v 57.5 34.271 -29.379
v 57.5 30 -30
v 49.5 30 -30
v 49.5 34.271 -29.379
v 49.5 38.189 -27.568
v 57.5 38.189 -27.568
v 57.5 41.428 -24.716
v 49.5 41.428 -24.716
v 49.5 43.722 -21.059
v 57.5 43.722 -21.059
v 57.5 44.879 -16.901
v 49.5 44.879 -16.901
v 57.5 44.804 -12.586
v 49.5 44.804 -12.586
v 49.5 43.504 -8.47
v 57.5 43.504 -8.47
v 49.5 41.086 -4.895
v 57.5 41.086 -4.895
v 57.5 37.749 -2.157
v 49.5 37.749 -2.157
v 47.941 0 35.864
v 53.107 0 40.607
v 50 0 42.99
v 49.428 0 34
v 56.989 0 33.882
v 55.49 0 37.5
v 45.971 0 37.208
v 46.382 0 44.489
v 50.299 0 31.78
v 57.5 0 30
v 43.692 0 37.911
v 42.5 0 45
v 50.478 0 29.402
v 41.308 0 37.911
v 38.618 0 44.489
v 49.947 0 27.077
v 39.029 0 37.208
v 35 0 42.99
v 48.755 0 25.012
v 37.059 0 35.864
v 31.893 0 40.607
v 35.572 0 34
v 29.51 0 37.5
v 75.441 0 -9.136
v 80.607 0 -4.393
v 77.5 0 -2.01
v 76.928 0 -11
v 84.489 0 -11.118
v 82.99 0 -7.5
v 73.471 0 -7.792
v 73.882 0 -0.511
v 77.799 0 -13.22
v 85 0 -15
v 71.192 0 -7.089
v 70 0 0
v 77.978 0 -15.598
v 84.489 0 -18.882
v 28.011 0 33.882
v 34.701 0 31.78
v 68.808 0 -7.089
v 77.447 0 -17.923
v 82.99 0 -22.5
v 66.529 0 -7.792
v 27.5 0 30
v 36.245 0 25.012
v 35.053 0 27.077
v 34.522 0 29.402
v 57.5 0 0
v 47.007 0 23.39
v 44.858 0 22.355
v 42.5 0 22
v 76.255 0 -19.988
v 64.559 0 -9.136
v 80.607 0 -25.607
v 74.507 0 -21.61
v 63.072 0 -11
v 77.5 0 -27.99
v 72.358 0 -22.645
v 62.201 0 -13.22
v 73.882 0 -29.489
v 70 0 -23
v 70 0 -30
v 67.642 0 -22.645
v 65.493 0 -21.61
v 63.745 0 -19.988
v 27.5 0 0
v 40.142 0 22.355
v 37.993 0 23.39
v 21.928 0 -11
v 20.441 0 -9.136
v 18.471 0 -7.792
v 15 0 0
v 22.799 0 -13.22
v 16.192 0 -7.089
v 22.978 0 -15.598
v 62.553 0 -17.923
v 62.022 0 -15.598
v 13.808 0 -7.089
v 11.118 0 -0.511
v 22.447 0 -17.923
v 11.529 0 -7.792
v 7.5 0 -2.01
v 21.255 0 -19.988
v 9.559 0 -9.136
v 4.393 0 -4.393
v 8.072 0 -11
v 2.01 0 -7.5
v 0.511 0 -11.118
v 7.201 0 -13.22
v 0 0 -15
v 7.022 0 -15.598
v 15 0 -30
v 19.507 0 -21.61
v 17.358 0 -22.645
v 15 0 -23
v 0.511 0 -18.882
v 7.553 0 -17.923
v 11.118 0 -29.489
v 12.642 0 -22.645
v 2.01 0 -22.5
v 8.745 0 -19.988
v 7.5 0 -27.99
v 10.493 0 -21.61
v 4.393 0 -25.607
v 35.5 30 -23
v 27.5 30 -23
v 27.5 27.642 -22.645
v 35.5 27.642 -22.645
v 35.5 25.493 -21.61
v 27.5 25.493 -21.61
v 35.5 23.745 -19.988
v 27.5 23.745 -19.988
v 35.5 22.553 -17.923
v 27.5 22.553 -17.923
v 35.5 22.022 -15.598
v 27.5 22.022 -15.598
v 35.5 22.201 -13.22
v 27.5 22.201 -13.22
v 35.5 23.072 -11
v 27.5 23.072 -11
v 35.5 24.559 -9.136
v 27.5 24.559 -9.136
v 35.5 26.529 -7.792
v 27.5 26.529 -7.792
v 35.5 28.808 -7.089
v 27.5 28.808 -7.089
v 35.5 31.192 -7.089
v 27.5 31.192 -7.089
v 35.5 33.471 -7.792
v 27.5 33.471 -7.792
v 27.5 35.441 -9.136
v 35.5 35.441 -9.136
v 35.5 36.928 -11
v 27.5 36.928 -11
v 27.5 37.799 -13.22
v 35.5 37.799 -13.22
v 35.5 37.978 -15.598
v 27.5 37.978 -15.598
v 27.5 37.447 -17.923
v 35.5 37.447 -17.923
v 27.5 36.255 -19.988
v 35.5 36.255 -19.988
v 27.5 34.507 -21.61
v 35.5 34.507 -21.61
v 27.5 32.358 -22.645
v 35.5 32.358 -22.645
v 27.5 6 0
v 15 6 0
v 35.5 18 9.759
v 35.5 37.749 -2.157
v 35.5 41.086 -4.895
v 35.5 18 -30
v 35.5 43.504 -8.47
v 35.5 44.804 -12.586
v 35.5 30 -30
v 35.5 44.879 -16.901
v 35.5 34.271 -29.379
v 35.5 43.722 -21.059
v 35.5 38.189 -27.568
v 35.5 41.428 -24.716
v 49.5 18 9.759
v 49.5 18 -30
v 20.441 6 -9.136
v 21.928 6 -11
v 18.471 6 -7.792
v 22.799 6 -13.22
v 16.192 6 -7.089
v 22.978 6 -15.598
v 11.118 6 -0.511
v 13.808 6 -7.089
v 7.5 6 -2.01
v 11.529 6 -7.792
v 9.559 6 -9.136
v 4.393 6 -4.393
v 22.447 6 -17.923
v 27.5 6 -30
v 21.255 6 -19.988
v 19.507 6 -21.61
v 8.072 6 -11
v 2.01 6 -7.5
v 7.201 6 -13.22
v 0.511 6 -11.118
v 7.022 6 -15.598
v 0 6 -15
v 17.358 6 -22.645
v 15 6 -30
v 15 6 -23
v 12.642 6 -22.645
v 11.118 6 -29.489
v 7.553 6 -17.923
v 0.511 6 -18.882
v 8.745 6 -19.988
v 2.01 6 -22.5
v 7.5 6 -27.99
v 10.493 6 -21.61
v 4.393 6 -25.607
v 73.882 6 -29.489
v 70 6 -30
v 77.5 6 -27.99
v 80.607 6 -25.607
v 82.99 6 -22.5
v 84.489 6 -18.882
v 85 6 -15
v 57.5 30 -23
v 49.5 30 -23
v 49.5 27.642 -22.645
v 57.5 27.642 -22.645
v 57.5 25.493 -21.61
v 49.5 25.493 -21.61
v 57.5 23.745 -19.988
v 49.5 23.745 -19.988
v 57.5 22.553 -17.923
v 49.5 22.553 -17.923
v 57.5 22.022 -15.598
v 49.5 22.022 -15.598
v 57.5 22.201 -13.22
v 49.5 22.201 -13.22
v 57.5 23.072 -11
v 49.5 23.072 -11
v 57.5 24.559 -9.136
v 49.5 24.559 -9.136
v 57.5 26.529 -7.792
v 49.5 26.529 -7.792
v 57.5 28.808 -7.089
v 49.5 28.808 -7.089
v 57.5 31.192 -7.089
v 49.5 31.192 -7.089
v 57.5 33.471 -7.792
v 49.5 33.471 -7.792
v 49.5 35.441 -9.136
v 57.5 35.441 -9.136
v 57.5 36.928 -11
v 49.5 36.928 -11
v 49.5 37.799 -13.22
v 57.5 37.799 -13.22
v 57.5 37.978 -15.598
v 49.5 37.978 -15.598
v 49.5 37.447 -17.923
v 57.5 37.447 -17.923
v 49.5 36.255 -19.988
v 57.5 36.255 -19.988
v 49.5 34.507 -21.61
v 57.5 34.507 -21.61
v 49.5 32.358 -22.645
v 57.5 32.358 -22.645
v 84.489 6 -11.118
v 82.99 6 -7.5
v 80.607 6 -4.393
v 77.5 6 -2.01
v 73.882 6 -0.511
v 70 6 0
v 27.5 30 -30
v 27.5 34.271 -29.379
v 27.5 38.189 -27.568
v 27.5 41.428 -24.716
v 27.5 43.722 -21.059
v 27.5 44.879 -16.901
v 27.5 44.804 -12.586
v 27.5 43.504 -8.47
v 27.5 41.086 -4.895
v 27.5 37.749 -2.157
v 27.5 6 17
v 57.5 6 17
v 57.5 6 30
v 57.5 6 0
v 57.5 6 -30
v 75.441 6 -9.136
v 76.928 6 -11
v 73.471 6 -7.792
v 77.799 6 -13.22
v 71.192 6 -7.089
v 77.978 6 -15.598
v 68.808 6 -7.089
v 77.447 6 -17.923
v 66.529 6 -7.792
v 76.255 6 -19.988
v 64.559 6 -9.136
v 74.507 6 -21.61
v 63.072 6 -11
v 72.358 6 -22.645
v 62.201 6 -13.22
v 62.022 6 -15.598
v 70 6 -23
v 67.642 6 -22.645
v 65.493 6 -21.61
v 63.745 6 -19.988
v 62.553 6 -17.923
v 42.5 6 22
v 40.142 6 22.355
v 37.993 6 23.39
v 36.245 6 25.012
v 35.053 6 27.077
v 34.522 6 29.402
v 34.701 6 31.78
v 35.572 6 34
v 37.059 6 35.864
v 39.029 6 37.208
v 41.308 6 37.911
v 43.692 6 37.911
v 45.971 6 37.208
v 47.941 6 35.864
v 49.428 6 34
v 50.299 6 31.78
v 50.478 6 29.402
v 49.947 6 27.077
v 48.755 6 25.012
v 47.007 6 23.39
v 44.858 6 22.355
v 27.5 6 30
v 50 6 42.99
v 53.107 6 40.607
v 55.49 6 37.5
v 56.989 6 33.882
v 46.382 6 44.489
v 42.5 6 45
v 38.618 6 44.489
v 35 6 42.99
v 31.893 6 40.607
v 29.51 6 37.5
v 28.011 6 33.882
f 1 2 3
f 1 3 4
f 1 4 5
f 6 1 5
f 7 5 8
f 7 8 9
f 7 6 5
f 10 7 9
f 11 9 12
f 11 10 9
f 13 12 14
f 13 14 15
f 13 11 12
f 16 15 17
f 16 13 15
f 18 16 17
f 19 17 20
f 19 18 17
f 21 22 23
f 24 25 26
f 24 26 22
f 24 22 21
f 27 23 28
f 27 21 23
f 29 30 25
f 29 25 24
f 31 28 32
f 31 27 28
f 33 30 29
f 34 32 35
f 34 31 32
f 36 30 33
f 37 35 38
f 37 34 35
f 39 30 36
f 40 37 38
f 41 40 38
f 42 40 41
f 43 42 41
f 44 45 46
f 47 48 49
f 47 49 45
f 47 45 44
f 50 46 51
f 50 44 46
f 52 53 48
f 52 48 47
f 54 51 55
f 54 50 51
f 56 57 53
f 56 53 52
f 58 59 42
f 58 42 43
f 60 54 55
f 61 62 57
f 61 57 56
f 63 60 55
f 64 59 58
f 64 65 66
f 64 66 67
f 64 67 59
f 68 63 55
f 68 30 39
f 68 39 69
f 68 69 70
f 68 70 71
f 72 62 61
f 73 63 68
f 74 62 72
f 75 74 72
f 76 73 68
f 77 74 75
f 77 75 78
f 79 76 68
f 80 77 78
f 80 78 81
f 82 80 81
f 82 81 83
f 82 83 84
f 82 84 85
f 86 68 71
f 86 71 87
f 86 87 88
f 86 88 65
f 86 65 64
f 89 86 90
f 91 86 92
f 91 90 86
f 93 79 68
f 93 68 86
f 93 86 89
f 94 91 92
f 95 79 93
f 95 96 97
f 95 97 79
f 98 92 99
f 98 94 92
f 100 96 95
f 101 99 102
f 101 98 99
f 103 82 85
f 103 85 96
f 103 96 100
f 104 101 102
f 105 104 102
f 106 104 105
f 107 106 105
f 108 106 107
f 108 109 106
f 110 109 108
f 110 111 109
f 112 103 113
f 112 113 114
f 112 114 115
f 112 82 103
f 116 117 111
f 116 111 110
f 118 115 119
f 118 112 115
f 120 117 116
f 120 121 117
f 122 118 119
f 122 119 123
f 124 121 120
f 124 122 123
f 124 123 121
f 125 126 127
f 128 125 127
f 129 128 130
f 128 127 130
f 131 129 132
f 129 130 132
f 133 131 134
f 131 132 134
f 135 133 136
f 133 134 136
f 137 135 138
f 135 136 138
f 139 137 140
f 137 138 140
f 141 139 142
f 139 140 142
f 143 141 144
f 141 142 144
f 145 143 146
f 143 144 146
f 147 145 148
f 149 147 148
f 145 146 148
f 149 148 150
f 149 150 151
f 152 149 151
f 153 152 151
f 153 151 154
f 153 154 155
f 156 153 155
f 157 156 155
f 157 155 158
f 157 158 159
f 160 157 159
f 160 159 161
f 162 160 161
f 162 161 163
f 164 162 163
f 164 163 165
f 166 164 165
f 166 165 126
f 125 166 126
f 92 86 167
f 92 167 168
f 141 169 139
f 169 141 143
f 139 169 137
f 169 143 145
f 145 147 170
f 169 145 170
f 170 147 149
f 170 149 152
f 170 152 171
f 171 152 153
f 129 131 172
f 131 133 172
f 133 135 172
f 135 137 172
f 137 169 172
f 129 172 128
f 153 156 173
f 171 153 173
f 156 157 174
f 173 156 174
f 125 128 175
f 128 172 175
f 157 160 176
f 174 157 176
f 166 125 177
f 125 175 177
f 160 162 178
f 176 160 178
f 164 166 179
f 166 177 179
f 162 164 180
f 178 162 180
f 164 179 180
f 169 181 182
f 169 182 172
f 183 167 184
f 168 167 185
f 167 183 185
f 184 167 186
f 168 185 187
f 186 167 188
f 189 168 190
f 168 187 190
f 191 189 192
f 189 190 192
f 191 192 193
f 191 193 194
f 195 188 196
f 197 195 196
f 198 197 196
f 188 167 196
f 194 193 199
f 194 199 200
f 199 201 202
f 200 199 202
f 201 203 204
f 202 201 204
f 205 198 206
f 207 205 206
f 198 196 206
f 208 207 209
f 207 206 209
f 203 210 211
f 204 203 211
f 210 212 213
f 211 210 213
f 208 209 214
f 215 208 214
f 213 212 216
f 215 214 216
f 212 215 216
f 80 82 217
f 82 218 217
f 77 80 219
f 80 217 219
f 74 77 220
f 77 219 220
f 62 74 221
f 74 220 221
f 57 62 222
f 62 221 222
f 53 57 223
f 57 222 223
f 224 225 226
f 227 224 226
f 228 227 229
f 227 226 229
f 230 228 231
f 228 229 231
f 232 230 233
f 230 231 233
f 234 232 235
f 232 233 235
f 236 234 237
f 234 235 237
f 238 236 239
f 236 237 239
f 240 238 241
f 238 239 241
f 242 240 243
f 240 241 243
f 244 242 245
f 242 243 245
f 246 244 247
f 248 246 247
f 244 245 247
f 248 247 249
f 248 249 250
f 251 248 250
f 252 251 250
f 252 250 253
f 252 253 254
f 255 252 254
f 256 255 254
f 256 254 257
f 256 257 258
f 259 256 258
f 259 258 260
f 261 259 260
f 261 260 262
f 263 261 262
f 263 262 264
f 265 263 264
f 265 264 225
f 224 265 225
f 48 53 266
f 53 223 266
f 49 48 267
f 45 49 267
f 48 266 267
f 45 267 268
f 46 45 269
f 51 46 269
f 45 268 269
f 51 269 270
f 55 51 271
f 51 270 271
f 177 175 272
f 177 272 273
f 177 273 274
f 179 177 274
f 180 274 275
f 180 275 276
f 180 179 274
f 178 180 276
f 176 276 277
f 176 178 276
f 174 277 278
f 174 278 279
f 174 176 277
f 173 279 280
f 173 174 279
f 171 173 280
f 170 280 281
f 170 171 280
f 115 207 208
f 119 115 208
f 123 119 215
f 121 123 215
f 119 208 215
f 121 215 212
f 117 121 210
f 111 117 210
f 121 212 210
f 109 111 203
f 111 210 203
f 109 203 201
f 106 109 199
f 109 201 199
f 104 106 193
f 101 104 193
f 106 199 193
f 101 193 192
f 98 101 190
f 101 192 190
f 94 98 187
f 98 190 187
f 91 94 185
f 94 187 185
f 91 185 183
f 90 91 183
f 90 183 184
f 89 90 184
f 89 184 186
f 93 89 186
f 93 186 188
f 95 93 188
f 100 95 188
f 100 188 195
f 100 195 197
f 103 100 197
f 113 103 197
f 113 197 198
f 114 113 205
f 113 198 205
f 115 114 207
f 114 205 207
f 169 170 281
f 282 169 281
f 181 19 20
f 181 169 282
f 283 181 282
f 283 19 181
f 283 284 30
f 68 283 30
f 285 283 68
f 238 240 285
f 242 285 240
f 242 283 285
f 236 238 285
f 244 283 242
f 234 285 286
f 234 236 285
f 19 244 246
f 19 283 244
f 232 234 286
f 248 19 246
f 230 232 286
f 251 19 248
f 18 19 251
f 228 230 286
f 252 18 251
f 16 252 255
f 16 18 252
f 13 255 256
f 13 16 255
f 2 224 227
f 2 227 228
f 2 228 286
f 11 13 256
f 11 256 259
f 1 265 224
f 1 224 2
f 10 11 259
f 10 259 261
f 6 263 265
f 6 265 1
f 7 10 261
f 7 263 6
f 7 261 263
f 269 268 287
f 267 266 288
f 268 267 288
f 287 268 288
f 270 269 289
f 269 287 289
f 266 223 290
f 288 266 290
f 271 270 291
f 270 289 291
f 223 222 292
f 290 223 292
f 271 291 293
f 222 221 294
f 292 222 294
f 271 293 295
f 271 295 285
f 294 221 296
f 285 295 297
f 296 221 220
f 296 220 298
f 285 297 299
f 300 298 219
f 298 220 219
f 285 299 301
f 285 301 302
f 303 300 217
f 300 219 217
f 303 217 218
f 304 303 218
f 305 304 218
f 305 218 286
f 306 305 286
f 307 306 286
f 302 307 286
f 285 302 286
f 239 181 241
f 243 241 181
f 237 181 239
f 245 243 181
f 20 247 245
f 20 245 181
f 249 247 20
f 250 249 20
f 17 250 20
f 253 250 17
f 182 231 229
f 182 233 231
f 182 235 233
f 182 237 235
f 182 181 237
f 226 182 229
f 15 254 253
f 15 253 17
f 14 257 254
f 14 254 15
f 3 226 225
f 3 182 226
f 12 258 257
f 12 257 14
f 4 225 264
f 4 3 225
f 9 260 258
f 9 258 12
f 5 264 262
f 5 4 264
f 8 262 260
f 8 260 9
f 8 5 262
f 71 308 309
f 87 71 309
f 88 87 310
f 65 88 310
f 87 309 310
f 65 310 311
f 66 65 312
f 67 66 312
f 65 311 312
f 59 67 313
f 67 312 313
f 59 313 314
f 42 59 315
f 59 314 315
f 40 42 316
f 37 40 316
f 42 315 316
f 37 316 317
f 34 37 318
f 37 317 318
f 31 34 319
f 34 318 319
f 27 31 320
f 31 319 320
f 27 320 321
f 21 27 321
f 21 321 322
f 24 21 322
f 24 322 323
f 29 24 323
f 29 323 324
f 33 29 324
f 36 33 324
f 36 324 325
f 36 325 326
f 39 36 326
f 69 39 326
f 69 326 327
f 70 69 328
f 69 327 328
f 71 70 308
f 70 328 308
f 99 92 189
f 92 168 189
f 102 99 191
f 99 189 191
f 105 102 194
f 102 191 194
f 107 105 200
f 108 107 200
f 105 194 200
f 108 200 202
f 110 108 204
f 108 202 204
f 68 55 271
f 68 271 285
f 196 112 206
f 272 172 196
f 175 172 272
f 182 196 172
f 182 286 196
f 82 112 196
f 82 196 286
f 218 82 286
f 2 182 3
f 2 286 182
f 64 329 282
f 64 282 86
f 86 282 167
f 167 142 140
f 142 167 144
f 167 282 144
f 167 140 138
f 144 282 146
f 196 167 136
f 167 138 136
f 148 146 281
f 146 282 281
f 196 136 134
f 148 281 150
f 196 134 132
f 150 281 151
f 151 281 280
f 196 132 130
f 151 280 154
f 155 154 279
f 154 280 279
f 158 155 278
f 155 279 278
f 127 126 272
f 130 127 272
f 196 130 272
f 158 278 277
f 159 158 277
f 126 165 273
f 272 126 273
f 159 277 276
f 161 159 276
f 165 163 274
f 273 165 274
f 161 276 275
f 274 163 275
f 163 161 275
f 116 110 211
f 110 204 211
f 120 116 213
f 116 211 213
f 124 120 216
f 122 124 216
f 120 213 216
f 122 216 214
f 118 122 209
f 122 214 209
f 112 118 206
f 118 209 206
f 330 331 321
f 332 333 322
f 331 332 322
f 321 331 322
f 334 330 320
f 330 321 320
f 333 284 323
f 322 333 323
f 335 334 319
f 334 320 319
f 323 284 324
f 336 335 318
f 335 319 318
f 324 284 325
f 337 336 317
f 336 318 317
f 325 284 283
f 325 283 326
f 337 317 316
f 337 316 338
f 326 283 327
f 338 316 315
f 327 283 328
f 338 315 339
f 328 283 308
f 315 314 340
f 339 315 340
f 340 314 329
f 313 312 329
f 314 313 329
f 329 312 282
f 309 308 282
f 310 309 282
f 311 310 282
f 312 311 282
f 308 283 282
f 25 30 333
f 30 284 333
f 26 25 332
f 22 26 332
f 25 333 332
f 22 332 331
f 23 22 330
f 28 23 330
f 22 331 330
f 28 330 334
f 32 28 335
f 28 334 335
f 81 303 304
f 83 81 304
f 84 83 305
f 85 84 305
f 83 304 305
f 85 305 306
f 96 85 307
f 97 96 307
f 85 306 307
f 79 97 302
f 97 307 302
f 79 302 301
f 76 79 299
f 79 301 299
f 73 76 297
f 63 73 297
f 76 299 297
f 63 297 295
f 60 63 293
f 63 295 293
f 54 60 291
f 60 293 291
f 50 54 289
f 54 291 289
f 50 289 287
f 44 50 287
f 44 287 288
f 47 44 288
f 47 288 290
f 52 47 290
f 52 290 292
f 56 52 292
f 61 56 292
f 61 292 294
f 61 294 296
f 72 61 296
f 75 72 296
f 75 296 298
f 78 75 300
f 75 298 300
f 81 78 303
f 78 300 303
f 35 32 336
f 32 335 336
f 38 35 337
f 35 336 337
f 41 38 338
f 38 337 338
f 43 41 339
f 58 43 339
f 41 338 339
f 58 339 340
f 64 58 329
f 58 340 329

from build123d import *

# Parameters (mm, degrees)
BOSS_EXTRUDE1_DEPTH                 = 6
FILLET1_R                           = 15
BOSS_EXTRUDE2_DEPTH                 = 30
F_16_0_16_DIAMETER_HOLE1_D          = 16
SKETCH4_W                           = 14
SKETCH4_H                           = 27
CUT_EXTRUDE1_DEPTH                  = 50
SKETCH5_W                           = 8
SKETCH5_H                           = 6.001
F_16_0_16_DIAMETER_HOLE2_AT_2_COUNT = 2
F_16_0_16_DIAMETER_HOLE2_AT_2_PITCH = 52.737557774
F_16_0_16_DIAMETER_HOLE2_AT_3_COUNT = 2
F_16_0_16_DIAMETER_HOLE2_AT_3_PITCH = 52.737557774


with BuildPart() as part:
    # Sketch1 → Boss-Extrude1 (new body)
    with BuildSketch(Plane(origin=(0, 0, 0), x_dir=(1, 0, 0), z_dir=(0, 1, 0))):
        Polygon((57.5, 0), (57.5, -45), (27.5, -45), (27.5, 0), (0, 0), (0, 30), (85, 30), (85, 0), align=None)
    extrude(amount=BOSS_EXTRUDE1_DEPTH)

    # Fillet1
    fillet1_edges = [part.edges().sort_by_distance(p)[0] for p in [
        (85, 3, -30),
        (85, 3, 0),
        (0, 3, -30),
        (0, 3, 0),
        (27.5, 3, 45),
        (57.5, 3, 45),
    ]]
    fillet(fillet1_edges, radius=FILLET1_R - 0.0001)  # a hair under: the kernel refuses the full size

    # Sketch2 → Boss-Extrude2 (add)
    with BuildSketch(Plane(origin=(57.5, 0, 0), x_dir=(0, 0, -1), z_dir=(1, 0, 0))):
        with BuildLine():
            Line((-17, 6), (30, 6))
            Line((30, 6), (30, 30))
            ThreePointArc((30, 30), (19.021918108, 44.450749971), (2.156776702, 37.749297731))
            Line((2.156776702, 37.749297731), (-17, 6))
        make_face()
    extrude(amount=-BOSS_EXTRUDE2_DEPTH)

    # Ø16.0 (16) Diameter Hole1 (through all)
    with Locations(Plane(origin=(57.5, 30, -15), x_dir=(0, 0, 1), z_dir=(1, 0, 0))):
        with Locations((0, 0)):
            Hole(F_16_0_16_DIAMETER_HOLE1_D / 2)

    # Sketch4 → Cut-Extrude1 (cut)
    with BuildSketch(Plane(origin=(0, 0, -30), x_dir=(-1, 0, 0), z_dir=(0, 0, -1))):
        with Locations((-42.5, 31.5)):
            Rectangle(SKETCH4_W, SKETCH4_H)
    extrude(amount=-CUT_EXTRUDE1_DEPTH, mode=Mode.SUBTRACT)

    # Sketch5 → Ø16.0 (16) Diameter Hole2 (revolve, cut)
    with BuildSketch(Plane(origin=(42.5, 0, 30), x_dir=(0, 0, -1), z_dir=(1, 0, 0))):
        with Locations((4, 3.0005)):
            Rectangle(SKETCH5_W, SKETCH5_H)
    f_16_0_16_diameter_hole2 = revolve(axis=Axis((42.5, -6.35, 30), (0, 1, 0)), mode=Mode.SUBTRACT)

    # Ø16.0 (16) Diameter Hole2 at 2: Ø16.0 (16) Diameter Hole2 ×2
    with Locations(*[Vector(-0.521450009453975, 0, -0.853281833651959) * (i * F_16_0_16_DIAMETER_HOLE2_AT_2_PITCH) for i in range(1, F_16_0_16_DIAMETER_HOLE2_AT_2_COUNT)]):
        add(f_16_0_16_diameter_hole2, mode=Mode.SUBTRACT)

    # Ø16.0 (16) Diameter Hole2 at 3: Ø16.0 (16) Diameter Hole2 ×2
    with Locations(*[Vector(0.5214500094539749, 0, -0.8532818336519591) * (i * F_16_0_16_DIAMETER_HOLE2_AT_3_PITCH) for i in range(1, F_16_0_16_DIAMETER_HOLE2_AT_3_COUNT)]):
        add(f_16_0_16_diameter_hole2, mode=Mode.SUBTRACT)


solid = part.part
